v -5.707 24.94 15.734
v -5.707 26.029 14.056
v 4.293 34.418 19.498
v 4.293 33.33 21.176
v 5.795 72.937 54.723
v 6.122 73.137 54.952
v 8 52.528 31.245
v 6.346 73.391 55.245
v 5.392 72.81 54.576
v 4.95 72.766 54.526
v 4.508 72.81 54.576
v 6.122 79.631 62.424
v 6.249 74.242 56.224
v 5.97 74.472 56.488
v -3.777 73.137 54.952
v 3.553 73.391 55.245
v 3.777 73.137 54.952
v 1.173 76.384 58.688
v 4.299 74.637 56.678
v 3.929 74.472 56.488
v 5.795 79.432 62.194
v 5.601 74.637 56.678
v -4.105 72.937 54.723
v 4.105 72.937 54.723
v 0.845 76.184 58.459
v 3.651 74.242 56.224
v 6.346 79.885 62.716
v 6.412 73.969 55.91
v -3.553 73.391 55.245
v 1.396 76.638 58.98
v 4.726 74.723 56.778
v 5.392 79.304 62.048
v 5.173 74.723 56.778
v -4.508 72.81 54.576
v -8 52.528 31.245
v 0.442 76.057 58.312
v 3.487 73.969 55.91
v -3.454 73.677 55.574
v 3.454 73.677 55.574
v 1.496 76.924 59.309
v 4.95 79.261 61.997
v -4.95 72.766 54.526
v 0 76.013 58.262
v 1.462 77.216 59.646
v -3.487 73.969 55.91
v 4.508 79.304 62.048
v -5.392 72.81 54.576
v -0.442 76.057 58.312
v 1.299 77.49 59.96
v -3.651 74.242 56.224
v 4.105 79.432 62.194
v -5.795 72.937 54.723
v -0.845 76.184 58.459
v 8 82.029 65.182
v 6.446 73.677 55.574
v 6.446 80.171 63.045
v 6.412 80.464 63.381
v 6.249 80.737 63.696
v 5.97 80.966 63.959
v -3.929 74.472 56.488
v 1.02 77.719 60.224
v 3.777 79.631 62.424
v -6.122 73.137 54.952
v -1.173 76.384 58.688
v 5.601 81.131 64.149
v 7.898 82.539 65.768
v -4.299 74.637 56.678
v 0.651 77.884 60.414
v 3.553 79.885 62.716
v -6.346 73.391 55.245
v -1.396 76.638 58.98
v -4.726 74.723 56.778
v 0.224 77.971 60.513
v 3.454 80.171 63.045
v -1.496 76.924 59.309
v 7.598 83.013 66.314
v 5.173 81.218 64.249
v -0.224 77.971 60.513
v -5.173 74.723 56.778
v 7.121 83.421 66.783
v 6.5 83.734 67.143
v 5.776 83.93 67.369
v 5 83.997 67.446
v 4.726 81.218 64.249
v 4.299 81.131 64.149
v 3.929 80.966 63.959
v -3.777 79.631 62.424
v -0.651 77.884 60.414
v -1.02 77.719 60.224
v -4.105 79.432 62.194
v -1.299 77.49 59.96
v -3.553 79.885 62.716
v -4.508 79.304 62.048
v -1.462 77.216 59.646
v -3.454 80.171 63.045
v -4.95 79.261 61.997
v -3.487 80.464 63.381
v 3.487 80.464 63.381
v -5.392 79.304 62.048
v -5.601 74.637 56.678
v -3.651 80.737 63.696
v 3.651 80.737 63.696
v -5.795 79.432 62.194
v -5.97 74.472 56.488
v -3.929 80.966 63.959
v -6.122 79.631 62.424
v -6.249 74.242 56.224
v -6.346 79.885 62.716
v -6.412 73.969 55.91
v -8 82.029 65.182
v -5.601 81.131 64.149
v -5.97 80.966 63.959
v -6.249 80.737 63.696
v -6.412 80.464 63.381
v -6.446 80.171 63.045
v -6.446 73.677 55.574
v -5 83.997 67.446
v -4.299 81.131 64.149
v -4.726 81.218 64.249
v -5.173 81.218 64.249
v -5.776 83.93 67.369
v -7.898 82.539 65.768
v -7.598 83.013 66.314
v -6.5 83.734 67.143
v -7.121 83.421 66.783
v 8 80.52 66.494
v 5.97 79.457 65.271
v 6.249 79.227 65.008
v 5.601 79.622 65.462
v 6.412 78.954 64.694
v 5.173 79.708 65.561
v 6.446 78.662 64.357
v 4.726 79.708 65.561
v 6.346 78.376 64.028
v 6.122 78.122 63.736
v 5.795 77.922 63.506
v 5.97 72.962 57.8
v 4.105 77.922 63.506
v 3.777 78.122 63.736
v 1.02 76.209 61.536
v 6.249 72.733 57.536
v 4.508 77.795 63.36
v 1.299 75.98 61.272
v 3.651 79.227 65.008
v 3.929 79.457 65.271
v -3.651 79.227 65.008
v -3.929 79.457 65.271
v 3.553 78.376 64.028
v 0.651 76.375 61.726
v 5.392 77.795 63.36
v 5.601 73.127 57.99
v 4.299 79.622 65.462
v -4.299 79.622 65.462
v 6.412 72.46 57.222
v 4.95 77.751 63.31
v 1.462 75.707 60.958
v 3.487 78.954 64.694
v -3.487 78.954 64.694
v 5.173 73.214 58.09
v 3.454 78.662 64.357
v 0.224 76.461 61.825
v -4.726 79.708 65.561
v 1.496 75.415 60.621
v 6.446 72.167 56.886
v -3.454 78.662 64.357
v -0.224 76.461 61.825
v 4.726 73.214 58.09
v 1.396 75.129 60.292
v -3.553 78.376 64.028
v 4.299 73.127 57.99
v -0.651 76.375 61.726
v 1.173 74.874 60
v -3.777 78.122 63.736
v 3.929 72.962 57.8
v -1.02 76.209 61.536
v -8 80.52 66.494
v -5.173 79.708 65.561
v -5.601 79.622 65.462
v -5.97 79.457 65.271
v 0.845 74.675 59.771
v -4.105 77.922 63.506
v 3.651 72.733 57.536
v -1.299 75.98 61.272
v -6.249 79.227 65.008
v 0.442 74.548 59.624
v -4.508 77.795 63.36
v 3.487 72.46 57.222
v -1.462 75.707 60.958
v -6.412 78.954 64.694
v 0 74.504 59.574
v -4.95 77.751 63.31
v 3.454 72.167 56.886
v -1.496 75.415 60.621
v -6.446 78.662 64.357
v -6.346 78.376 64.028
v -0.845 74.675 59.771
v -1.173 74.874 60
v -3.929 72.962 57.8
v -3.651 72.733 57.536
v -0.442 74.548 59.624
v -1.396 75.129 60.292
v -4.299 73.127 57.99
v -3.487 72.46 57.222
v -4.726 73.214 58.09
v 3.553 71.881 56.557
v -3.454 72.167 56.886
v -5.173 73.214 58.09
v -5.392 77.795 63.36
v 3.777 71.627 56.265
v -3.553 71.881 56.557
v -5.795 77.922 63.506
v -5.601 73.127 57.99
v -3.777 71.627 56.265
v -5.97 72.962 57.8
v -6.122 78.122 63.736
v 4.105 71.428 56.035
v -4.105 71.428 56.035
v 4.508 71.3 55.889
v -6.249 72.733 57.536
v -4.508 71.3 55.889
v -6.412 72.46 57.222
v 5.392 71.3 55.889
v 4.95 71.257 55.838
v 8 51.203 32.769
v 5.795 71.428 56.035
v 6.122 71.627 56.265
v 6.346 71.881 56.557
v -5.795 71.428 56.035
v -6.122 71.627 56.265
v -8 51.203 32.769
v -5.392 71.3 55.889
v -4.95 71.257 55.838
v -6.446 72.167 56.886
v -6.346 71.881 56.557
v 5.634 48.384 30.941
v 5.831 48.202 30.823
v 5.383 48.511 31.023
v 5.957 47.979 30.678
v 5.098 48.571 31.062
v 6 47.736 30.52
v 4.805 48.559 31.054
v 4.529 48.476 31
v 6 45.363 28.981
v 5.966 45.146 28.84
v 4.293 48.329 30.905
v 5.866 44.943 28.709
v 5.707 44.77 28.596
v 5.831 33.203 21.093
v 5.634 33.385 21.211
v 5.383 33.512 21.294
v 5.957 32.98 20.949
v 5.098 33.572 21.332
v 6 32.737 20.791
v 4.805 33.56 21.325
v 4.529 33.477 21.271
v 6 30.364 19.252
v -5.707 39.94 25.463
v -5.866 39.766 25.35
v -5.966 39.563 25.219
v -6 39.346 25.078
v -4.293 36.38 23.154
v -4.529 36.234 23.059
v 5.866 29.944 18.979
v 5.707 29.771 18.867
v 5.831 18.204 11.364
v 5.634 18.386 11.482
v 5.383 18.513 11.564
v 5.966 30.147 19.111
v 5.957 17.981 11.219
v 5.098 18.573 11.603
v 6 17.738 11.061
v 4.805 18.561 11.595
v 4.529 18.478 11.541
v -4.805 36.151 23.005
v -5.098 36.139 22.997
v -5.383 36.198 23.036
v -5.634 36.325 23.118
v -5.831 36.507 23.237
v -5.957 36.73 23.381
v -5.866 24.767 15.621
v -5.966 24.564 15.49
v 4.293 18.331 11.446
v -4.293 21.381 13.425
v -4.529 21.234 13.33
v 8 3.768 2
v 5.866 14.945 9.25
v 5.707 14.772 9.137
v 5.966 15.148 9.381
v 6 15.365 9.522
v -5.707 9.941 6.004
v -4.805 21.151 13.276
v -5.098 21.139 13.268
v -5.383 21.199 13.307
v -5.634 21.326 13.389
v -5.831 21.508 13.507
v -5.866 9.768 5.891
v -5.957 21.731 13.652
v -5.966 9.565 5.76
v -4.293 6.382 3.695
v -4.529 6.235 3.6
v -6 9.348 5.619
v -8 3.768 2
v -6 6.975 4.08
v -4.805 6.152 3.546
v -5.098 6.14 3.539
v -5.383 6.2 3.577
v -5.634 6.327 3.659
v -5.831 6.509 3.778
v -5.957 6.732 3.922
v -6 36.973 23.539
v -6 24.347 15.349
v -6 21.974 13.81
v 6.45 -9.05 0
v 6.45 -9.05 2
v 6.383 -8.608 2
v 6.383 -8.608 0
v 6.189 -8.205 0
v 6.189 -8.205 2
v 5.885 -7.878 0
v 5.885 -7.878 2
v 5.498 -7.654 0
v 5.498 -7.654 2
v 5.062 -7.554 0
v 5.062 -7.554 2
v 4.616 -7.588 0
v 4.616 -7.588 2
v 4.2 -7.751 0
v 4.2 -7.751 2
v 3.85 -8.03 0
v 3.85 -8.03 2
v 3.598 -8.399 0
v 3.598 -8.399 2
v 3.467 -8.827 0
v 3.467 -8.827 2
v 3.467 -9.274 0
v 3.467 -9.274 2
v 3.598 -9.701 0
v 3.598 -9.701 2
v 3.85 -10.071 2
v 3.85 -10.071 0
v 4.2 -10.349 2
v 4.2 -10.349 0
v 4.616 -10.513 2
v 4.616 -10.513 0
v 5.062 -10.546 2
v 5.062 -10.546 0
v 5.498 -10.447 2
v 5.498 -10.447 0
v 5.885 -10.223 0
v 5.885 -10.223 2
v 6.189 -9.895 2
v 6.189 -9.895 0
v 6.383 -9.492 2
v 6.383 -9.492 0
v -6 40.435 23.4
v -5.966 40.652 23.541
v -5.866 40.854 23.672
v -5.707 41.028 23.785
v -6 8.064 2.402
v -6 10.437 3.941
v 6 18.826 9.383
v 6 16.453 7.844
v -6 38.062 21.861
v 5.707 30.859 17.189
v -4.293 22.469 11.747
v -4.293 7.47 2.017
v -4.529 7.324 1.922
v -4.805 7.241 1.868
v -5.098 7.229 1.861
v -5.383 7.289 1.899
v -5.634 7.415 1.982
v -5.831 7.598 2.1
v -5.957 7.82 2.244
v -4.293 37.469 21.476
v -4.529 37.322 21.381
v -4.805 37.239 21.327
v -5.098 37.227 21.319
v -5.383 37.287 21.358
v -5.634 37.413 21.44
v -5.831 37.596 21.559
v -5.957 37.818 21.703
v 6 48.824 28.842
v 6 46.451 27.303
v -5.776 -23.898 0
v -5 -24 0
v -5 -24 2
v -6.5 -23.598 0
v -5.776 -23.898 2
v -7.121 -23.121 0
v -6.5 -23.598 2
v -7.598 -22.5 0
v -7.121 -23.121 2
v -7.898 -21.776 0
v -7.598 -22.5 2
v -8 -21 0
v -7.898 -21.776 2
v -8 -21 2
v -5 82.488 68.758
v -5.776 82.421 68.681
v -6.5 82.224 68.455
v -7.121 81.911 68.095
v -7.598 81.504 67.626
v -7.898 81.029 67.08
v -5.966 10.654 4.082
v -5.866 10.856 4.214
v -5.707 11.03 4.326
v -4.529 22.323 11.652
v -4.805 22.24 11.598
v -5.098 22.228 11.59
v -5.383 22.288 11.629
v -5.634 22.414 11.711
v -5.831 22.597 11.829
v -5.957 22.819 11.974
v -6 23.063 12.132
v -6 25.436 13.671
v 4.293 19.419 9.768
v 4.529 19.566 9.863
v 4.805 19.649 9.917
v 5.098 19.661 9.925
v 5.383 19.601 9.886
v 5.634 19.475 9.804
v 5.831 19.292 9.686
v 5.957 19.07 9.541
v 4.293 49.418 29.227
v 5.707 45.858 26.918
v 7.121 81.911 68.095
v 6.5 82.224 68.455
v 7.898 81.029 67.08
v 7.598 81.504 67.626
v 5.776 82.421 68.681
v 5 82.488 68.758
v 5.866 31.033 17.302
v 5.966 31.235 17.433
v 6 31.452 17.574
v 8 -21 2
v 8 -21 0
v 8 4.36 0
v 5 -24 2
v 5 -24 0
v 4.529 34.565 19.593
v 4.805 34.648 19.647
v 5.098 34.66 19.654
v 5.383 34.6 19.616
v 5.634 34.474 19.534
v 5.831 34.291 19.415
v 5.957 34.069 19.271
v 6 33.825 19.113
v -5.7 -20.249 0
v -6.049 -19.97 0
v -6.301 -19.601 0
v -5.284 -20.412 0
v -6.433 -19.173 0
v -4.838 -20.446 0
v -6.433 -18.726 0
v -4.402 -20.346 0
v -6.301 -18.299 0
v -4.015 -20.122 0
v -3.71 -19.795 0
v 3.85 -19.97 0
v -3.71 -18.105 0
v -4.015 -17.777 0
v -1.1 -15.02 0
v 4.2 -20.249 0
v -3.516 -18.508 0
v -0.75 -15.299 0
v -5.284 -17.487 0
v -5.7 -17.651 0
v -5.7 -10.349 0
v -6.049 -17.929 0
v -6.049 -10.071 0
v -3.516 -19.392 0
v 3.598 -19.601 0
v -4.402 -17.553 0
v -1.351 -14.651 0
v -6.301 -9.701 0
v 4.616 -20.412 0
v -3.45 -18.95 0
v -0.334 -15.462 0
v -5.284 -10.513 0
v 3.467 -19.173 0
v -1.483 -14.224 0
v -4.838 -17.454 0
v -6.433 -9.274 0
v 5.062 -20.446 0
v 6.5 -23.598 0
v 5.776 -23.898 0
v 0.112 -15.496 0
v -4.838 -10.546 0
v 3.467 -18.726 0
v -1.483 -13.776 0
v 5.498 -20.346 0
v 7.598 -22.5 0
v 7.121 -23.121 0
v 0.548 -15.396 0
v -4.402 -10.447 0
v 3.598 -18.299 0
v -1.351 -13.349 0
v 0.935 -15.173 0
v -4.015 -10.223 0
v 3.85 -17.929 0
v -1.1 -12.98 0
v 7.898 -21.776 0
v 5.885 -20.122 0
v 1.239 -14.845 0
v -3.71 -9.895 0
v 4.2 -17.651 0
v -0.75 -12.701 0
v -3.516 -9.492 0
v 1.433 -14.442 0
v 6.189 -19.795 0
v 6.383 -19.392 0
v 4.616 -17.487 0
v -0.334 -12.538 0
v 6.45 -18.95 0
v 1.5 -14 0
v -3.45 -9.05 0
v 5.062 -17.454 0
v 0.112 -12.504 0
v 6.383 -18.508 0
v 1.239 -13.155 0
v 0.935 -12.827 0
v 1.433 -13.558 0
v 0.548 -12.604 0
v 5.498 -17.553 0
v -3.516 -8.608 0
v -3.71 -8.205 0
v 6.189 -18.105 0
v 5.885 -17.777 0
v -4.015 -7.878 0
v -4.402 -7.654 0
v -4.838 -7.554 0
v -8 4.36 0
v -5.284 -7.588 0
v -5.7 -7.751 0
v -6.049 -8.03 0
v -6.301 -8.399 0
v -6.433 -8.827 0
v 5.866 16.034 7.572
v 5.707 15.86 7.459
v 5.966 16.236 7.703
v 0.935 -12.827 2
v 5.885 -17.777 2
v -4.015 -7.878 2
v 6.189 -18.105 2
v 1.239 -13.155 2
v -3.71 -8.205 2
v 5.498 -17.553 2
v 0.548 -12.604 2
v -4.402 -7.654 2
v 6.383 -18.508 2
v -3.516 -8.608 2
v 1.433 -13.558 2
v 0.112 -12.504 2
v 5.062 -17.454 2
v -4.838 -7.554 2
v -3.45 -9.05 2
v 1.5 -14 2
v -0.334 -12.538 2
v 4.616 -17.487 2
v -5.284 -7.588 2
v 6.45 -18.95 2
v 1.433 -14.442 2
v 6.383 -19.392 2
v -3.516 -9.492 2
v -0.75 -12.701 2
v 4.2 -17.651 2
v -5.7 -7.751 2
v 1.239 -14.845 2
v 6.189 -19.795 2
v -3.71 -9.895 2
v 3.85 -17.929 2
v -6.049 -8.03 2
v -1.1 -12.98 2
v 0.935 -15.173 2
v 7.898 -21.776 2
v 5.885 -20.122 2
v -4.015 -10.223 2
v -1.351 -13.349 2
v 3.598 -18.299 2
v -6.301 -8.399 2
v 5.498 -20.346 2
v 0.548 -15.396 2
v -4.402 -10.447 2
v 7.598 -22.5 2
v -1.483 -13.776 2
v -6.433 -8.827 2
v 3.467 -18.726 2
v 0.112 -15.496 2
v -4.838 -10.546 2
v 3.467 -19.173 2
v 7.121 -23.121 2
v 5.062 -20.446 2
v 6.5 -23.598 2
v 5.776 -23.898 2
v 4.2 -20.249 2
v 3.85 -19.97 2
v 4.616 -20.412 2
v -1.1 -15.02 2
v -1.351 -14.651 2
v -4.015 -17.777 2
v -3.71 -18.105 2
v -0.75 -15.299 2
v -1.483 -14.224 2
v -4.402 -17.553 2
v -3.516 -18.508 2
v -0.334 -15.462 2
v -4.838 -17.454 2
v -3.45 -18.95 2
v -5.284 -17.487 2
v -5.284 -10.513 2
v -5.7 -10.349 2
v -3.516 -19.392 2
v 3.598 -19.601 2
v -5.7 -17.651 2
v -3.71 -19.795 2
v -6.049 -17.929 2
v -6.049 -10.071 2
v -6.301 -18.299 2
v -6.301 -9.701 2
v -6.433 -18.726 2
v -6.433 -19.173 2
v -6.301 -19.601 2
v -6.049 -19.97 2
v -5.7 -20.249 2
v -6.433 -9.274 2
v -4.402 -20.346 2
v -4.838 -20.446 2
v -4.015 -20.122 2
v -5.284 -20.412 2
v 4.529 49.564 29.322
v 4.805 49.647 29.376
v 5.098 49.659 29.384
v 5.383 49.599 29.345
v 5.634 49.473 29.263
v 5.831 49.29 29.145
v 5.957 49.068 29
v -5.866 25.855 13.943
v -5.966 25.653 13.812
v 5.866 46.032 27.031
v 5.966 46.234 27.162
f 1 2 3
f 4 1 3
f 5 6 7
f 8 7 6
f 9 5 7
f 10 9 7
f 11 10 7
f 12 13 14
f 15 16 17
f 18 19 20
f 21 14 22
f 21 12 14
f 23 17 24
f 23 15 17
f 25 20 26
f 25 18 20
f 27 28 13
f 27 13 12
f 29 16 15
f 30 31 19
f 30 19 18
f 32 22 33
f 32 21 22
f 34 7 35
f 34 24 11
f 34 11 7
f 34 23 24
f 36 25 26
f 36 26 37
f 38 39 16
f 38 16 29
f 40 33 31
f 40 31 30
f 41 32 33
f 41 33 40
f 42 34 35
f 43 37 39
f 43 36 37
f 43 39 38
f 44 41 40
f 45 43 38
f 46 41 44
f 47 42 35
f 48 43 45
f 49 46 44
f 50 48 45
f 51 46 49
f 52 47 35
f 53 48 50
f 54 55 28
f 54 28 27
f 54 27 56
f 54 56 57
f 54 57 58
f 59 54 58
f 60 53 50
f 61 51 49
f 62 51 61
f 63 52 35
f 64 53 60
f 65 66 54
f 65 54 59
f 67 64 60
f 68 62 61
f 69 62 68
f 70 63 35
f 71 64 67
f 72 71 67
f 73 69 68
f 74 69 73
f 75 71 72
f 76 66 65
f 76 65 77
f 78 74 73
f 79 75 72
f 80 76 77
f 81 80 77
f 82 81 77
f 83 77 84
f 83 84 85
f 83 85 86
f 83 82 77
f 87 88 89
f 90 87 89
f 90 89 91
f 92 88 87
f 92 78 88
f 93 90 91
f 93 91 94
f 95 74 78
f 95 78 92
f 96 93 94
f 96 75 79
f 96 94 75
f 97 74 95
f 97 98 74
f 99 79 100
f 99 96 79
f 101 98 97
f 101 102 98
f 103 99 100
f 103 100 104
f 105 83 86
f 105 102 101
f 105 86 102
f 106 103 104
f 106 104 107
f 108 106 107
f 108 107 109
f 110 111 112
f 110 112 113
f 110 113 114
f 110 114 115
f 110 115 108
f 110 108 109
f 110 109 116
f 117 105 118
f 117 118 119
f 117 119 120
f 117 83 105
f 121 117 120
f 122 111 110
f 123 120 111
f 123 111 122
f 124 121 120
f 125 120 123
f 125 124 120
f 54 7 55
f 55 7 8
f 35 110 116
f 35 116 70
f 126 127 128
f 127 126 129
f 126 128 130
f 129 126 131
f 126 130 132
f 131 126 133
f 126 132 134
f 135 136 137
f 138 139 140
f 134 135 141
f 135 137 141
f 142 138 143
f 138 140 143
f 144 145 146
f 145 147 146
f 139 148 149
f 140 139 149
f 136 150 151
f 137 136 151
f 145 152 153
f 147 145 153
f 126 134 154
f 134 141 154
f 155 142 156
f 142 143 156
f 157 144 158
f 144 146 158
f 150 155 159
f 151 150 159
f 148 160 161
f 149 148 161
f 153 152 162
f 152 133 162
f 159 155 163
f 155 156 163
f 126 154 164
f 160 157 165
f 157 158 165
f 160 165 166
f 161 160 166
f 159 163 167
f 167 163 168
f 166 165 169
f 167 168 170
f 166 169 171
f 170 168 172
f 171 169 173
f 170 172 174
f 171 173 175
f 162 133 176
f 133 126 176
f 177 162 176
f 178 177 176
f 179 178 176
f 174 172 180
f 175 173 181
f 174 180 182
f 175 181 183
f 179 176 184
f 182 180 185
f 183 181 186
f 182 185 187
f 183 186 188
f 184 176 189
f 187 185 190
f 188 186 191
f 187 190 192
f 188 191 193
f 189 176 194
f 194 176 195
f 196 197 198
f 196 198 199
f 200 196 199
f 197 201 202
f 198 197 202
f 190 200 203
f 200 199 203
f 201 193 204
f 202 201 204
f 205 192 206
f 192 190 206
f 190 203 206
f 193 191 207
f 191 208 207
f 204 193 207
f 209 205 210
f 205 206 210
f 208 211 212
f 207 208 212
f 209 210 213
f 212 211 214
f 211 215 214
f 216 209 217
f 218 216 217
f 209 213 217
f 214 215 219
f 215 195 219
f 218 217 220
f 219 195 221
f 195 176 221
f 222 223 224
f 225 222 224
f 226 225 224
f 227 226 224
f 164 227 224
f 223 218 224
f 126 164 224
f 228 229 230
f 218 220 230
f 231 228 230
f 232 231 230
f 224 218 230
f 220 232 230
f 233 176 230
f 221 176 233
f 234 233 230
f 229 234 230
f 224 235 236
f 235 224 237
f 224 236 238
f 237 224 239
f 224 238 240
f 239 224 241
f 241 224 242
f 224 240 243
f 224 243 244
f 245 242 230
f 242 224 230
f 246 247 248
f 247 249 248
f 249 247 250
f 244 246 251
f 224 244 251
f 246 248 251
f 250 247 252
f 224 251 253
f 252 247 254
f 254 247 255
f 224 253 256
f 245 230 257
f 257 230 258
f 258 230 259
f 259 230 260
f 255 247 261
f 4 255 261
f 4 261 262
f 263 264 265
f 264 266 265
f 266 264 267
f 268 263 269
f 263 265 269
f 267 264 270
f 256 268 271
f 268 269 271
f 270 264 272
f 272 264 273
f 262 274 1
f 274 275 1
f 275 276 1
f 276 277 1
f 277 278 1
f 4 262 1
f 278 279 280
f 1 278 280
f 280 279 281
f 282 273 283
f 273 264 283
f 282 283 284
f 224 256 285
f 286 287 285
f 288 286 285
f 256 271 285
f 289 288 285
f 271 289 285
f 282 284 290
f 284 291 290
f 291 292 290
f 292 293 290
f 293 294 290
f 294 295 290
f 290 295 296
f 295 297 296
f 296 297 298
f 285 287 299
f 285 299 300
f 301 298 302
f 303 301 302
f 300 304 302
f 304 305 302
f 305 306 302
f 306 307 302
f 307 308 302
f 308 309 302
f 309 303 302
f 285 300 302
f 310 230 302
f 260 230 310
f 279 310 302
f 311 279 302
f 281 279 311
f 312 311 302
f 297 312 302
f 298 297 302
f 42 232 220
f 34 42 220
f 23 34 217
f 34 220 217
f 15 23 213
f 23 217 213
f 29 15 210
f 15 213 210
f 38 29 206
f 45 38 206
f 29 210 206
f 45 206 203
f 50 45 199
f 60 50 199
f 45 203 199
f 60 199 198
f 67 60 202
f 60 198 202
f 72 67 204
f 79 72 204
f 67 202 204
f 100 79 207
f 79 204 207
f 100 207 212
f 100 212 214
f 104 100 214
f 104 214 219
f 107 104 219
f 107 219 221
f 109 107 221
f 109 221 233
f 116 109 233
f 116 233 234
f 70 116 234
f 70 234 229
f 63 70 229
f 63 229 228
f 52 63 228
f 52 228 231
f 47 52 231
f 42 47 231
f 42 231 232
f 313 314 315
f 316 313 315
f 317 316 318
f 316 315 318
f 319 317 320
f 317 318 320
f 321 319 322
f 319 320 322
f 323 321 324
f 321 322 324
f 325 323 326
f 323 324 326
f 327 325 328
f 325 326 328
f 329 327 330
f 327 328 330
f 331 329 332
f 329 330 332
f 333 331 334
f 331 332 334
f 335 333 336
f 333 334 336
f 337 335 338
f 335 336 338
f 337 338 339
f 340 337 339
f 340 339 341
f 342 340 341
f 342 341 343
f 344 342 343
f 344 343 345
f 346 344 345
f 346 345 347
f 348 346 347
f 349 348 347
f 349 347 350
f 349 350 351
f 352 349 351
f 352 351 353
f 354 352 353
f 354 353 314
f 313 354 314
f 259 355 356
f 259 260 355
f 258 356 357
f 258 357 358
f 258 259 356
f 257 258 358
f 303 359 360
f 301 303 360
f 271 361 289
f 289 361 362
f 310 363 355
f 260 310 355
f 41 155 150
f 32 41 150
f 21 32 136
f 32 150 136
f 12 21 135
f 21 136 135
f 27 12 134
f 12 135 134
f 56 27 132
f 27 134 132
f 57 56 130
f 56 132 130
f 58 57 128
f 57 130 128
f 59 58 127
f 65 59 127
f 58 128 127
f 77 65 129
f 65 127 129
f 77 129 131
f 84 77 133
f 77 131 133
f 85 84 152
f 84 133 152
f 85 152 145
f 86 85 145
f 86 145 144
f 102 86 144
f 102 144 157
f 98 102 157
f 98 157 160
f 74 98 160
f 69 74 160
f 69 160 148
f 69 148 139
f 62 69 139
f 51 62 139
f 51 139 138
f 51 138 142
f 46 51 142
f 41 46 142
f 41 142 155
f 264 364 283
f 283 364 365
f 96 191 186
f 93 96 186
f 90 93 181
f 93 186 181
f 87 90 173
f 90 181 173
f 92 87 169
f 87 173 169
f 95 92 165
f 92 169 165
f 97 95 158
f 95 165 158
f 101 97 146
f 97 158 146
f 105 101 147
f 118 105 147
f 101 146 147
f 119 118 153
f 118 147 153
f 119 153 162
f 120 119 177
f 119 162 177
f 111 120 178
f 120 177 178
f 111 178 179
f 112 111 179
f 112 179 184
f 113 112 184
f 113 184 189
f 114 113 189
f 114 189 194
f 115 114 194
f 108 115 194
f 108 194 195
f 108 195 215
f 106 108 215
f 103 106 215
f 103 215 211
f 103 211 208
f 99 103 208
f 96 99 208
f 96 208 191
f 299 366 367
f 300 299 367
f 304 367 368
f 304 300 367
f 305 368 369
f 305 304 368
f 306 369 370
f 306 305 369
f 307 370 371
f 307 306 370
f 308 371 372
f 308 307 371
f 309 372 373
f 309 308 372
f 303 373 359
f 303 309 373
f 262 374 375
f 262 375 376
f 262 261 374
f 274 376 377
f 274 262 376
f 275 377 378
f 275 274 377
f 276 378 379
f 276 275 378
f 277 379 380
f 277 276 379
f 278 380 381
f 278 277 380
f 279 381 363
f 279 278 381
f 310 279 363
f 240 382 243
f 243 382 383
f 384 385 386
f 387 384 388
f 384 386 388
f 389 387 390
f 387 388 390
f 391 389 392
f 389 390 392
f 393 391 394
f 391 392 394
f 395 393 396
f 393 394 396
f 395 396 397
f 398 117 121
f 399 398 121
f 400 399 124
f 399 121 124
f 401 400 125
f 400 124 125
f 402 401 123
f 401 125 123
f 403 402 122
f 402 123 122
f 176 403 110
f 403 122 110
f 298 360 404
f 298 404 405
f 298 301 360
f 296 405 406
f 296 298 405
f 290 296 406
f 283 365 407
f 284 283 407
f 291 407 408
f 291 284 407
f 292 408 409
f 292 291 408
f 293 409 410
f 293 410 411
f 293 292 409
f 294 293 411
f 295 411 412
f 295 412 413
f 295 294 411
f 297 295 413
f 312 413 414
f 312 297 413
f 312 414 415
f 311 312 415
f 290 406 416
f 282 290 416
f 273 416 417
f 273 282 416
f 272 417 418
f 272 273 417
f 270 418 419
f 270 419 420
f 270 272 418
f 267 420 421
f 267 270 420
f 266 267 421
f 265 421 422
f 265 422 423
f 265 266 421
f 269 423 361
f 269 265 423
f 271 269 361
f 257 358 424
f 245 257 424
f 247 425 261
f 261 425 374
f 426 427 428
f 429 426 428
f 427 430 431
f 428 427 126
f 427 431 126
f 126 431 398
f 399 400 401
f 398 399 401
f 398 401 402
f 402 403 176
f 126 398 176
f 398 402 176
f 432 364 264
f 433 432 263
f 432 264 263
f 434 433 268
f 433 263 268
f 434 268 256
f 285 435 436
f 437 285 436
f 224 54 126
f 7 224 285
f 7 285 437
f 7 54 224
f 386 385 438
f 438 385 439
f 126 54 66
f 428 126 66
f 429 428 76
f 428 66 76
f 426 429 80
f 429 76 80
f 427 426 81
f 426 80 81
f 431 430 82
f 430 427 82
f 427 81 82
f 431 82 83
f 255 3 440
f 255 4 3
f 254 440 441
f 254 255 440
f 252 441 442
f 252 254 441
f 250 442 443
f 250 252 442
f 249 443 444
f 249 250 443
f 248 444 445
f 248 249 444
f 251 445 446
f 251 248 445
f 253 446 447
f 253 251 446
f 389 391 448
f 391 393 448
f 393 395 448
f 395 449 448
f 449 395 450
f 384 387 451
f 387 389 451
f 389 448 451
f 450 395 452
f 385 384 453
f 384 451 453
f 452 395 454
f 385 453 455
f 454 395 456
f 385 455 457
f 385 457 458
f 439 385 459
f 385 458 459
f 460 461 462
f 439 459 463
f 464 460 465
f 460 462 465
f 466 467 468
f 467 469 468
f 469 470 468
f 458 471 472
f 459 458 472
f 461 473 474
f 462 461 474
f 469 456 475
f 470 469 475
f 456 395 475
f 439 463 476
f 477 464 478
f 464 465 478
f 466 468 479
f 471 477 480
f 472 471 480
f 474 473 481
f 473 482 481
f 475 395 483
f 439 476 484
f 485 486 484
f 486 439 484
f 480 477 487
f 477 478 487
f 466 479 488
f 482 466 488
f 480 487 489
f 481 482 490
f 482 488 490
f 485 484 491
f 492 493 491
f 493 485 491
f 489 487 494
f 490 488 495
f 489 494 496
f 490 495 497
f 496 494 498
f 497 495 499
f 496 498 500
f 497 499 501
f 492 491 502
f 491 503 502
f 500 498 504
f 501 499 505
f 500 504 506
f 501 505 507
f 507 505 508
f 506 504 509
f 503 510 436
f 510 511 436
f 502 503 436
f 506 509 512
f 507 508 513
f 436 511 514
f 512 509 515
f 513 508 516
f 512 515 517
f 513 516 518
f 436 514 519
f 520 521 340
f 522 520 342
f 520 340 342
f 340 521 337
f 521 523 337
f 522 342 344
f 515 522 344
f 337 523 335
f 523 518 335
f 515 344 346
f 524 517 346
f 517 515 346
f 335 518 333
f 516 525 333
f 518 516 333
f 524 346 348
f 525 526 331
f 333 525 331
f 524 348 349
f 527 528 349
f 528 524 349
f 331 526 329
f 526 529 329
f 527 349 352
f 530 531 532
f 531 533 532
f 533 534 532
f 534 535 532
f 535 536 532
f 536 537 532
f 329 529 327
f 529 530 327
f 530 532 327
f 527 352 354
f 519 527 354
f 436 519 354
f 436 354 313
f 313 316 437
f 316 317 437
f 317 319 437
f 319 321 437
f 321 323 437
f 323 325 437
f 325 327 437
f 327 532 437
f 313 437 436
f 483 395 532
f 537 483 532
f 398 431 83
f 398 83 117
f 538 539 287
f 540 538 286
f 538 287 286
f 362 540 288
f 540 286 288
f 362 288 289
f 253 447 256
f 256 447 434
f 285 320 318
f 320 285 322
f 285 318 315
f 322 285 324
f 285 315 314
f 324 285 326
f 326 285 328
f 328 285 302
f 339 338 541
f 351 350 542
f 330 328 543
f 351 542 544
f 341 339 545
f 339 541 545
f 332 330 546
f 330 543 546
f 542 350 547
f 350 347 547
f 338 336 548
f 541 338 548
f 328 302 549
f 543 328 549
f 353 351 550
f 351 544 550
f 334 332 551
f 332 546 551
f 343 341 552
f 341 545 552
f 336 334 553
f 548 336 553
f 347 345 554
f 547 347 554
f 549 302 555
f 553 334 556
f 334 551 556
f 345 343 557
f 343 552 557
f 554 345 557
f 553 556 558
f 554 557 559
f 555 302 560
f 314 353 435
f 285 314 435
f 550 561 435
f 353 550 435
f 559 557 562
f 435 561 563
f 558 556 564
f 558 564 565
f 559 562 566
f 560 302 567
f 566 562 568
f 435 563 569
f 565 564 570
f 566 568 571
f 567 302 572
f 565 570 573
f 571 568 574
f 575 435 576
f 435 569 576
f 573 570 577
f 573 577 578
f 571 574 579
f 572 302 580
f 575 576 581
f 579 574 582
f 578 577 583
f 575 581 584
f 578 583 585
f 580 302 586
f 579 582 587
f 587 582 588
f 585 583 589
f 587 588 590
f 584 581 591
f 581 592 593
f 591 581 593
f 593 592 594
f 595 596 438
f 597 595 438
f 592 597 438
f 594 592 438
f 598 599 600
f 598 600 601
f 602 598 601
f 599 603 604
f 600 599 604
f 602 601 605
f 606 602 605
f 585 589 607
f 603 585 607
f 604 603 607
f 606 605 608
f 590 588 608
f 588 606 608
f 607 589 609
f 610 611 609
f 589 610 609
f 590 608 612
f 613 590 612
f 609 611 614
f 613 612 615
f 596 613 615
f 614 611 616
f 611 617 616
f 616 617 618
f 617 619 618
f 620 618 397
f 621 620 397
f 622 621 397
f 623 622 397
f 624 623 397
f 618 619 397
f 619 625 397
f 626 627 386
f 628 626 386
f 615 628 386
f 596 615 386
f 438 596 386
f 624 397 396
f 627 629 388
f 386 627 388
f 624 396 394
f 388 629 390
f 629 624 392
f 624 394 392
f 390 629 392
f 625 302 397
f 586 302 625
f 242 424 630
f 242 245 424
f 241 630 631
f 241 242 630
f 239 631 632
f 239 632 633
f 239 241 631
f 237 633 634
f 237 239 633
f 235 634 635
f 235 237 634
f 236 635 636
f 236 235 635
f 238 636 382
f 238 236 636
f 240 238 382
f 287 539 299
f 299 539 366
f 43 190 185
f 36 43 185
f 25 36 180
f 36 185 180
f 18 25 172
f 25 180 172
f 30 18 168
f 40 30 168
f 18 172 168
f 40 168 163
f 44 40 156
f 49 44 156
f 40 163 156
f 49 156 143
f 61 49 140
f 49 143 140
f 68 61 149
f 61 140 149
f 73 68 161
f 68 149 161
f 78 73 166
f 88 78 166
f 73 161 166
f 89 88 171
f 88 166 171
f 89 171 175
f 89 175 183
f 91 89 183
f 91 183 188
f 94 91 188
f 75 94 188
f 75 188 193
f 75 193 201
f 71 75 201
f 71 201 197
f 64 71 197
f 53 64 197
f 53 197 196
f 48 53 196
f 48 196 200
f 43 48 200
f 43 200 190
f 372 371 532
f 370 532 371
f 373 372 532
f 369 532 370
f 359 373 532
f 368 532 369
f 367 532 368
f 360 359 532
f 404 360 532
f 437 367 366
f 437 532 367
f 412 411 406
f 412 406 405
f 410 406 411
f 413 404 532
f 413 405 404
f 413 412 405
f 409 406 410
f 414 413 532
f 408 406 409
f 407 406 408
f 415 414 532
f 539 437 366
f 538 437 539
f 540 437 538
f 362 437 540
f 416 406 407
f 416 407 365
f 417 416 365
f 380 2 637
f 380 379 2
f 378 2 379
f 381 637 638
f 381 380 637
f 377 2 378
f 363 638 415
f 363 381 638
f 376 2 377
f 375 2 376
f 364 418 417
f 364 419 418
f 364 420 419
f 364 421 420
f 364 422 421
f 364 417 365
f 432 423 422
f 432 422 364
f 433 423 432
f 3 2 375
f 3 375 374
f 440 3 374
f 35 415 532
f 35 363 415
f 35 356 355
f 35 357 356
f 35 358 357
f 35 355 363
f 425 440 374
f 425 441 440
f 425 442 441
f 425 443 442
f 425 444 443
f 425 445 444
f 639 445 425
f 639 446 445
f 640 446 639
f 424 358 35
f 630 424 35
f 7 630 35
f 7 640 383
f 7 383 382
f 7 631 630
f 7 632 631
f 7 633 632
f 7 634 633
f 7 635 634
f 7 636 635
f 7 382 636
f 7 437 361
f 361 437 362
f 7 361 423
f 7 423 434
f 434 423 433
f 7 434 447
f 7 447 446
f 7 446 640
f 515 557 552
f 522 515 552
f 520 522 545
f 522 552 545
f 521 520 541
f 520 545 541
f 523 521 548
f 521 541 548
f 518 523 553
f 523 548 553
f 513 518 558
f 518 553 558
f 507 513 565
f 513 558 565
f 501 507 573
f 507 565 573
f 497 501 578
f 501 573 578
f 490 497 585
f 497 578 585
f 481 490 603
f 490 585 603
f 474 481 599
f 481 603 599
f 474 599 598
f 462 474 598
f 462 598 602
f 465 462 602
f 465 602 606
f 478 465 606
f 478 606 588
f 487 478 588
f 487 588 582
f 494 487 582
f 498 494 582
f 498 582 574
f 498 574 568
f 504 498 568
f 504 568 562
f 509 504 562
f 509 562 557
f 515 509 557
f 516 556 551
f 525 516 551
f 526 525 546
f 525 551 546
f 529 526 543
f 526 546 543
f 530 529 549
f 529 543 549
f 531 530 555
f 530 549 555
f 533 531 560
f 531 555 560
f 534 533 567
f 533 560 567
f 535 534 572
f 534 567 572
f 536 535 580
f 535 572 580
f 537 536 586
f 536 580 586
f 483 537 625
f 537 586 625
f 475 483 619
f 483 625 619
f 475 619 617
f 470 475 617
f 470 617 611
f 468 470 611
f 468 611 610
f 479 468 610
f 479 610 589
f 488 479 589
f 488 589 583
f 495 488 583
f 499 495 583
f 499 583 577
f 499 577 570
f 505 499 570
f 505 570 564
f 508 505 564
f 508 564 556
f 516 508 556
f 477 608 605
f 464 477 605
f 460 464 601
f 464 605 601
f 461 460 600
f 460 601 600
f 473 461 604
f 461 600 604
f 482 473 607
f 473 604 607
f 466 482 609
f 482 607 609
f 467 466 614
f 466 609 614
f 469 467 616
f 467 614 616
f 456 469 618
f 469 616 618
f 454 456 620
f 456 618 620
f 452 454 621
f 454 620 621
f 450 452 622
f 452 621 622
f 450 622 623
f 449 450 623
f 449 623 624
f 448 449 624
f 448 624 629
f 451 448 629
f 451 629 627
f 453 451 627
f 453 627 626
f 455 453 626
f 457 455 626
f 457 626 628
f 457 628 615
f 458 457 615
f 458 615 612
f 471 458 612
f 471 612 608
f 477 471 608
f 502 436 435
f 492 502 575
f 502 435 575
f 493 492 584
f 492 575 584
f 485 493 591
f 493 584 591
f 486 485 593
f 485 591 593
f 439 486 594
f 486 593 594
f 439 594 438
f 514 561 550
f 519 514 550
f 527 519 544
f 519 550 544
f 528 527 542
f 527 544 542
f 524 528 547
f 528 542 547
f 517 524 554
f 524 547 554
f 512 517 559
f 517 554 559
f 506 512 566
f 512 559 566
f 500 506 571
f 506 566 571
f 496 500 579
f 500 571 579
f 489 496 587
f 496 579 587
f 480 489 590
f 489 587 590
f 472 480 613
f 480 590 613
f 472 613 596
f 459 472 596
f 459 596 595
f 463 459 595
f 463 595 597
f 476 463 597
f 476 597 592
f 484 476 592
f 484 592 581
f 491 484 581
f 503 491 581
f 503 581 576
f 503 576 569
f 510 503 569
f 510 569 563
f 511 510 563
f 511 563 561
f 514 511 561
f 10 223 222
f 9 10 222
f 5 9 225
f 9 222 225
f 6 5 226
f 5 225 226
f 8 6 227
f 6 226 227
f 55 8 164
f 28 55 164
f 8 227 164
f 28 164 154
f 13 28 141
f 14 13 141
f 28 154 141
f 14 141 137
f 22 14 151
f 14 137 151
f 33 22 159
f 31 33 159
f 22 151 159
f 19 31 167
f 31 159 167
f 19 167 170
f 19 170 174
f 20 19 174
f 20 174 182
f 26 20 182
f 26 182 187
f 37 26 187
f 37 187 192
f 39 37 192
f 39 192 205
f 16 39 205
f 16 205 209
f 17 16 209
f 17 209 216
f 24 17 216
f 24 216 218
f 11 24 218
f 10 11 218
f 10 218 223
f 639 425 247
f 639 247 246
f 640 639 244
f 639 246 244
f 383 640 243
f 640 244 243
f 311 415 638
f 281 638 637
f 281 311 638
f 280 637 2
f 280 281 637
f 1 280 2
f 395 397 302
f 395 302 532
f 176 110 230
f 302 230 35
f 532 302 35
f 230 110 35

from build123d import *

# Parameters (mm, degrees)
SKETCH_1_W          = 16
SKETCH_1_H          = 48
EXTRUDE_1_DEPTH     = 3
SKETCH_2_R          = 1.5
CUT_EXTRUDE_1_DEPTH = 26.475478406
SKETCH_3_W          = 16
SKETCH_3_H          = 88
EXTRUDE_2_DEPTH     = 3
SKETCH_4_W          = 16
SKETCH_4_H          = 3
EXTRUDE_3_DEPTH     = 2
SKETCH_5_R          = 1.5
CUT_EXTRUDE_2_DEPTH = 108.805767963
FILLET_3_R          = 3
EXTRUDE_4_DEPTH     = 16
CUT_EXTRUDE_3_DEPTH = 111.135894355
CUT_EXTRUDE_4_DEPTH = 111.135894355
CUT_EXTRUDE_5_DEPTH = 110.131666201
FILLET_4_R          = 1


with BuildPart() as part:
    # 草图1 → 凸台-拉伸1 (new body)
    with BuildSketch(Plane.XY):
        Rectangle(SKETCH_1_W, SKETCH_1_H)
    extrude(amount=EXTRUDE_1_DEPTH)

    # 草图2 → 切除-拉伸1 (cut, through all)
    with BuildSketch(Plane.XY.offset(3)):
        with Locations((-4.949747468, -9.050252532)):
            Circle(SKETCH_2_R)
        with Locations((0, -14)):
            Circle(SKETCH_2_R)
        with Locations((4.949747468, -9.050252532)):
            Circle(SKETCH_2_R)
        with Locations((4.949747468, -18.949747468)):
            Circle(SKETCH_2_R)
        with Locations((-4.949747468, -18.949747468)):
            Circle(SKETCH_2_R)
    extrude(amount=-CUT_EXTRUDE_1_DEPTH, mode=Mode.SUBTRACT)



with BuildPart() as body_2:
    # 草图3 → 凸台-拉伸2 (new body)
    with BuildSketch(Plane(origin=(0, 12.184675108, -10.591976476), x_dir=(-1, 0, 0), z_dir=(0, 0.7547095802227686, -0.6560590289905112))):
        with Locations((0, 62.009545436)):
            Rectangle(SKETCH_3_W, SKETCH_3_H)
    extrude(amount=EXTRUDE_2_DEPTH)


with BuildPart() as part_1:
    add(part.part)

    add(body_2.part)  # 凸台-拉伸3 merges body 2
    # 草图4 → 凸台-拉伸3 (add)
    with BuildSketch(Plane(origin=(0, 11.815324892, 13.591976476), x_dir=(-1, 0, 0), z_dir=(0, -0.6560590289905113, -0.7547095802227686))):
        with Locations((0, 17.644852838)):
            Rectangle(SKETCH_4_W, SKETCH_4_H)
    extrude(amount=EXTRUDE_3_DEPTH)

    # 草图5 → 切除-拉伸2 (cut, through all)
    with BuildSketch(Plane(origin=(0, 12.184675108, -10.591976476), x_dir=(1, 0, 0), z_dir=(0, -0.7547095802227686, 0.6560590289905113))):
        with Locations(Location((0, 95.34, 0), (0, 0, 270))):
            Circle(SKETCH_5_R)
        with Locations(Location((-4.949747468, 100.289747468, 0), (0, 0, 270))):
            Circle(SKETCH_5_R)
        with Locations(Location((4.949747468, 100.289747468, 0), (0, 0, 270))):
            Circle(SKETCH_5_R)
        with Locations(Location((4.949747468, 90.390252532, 0), (0, 0, 270))):
            Circle(SKETCH_5_R)
        with Locations(Location((-4.949747468, 90.390252532, 0), (0, 0, 270))):
            Circle(SKETCH_5_R)
    extrude(amount=-CUT_EXTRUDE_2_DEPTH, mode=Mode.SUBTRACT)

    # 圆角3
    fillet_3_edges = [part_1.edges().sort_by_distance(p)[0] for p in [
        (8, 82.865258921, 68.430354516),
        (-8, 82.865258921, 68.430354516),
        (8, -24, 1.5),
        (-8, -24, 1.5),
    ]]
    fillet(fillet_3_edges, radius=FILLET_3_R)

    # 草图6 → 凸台-拉伸4 (add)
    with BuildSketch(Plane.ZY.offset(8)):
        Polygon((33.531489951, 50.5406193), (3, 3.472509188), (0, 4.360298556), (31.244508057, 52.52761525), align=None)
    extrude(amount=-EXTRUDE_4_DEPTH)

    # 草图9 → 切除-拉伸3 (cut, through all)
    with BuildSketch(Plane(origin=(8, 0, 0), x_dir=(0, 0, -1), z_dir=(1, 0, 0))):
        Polygon((0, 4.360298556), (-31.244508057, 52.52761525), (6.052752185, 30.680291416), align=None)
    extrude(amount=-CUT_EXTRUDE_3_DEPTH, mode=Mode.SUBTRACT)

    # 草图11 → 切除-拉伸4 (cut, through all)
    with BuildSketch(Plane.ZY.offset(8)):
        Polygon((33.531489951, 50.5406193), (3, 3.472509188), (3, -21), (2, -21), (2, -26.591575896), (76.346344159, 89.084017238), (66.49425529, 80.519727044), (67.150314319, 79.765017464), align=None)
        Polygon((66.49425529, 80.519727044), (32.769162653, 51.202951283), (33.531489951, 50.5406193), (67.150314319, 79.765017464), align=None)
        Polygon((32.769162653, 51.202951283), (2, 3.768438978), (3, 3.472509188), (33.531489951, 50.5406193), align=None)
        Polygon((3, 3.472509188), (2, 3.768438978), (2, -21), (3, -21), align=None)
    extrude(amount=-CUT_EXTRUDE_4_DEPTH, mode=Mode.SUBTRACT)

    # 草图12 → 切除-拉伸5 (cut, through all)
    with BuildSketch(Plane(origin=(0, 1.291325132, -1.990739187), x_dir=(-1, 0, 0), z_dir=(0, 0.5442014418825505, -0.8389545819965185))):
        Polygon((-6, 53.414735581), (6, 41.414735581), (6, 47.07158983), (-6, 59.07158983), align=None)
        Polygon((-6, 17.658092453), (6, 5.658092453), (6, 11.314946702), (-6, 23.314946702), align=None)
        Polygon((-6, 35.536414017), (6, 23.536414017), (6, 29.193268266), (-6, 41.193268266), align=None)
    extrude(amount=-CUT_EXTRUDE_5_DEPTH, mode=Mode.SUBTRACT)

    # 圆角4
    fillet_4_edges = [part_1.edges().sort_by_distance(p)[0] for p in [
        (6, 50.305504644, 30.995059755),
        (-6, 40.23804966, 24.464642452),
        (-6, 35.492205868, 21.386174213),
        (6, 45.559660852, 27.916591516),
        (6, 35.306404849, 21.265651381),
        (-6, 20.493106073, 11.656765839),
        (-6, 25.238949865, 14.735234079),
        (6, 30.560561057, 18.187183142),
        (6, 20.307305055, 11.536243007),
        (-6, 10.239850071, 5.005825705),
        (-6, 5.494006278, 1.927357466),
        (6, 15.561461262, 8.457774768),
    ]]
    fillet(fillet_4_edges, radius=FILLET_4_R)


solid = part_1.part
